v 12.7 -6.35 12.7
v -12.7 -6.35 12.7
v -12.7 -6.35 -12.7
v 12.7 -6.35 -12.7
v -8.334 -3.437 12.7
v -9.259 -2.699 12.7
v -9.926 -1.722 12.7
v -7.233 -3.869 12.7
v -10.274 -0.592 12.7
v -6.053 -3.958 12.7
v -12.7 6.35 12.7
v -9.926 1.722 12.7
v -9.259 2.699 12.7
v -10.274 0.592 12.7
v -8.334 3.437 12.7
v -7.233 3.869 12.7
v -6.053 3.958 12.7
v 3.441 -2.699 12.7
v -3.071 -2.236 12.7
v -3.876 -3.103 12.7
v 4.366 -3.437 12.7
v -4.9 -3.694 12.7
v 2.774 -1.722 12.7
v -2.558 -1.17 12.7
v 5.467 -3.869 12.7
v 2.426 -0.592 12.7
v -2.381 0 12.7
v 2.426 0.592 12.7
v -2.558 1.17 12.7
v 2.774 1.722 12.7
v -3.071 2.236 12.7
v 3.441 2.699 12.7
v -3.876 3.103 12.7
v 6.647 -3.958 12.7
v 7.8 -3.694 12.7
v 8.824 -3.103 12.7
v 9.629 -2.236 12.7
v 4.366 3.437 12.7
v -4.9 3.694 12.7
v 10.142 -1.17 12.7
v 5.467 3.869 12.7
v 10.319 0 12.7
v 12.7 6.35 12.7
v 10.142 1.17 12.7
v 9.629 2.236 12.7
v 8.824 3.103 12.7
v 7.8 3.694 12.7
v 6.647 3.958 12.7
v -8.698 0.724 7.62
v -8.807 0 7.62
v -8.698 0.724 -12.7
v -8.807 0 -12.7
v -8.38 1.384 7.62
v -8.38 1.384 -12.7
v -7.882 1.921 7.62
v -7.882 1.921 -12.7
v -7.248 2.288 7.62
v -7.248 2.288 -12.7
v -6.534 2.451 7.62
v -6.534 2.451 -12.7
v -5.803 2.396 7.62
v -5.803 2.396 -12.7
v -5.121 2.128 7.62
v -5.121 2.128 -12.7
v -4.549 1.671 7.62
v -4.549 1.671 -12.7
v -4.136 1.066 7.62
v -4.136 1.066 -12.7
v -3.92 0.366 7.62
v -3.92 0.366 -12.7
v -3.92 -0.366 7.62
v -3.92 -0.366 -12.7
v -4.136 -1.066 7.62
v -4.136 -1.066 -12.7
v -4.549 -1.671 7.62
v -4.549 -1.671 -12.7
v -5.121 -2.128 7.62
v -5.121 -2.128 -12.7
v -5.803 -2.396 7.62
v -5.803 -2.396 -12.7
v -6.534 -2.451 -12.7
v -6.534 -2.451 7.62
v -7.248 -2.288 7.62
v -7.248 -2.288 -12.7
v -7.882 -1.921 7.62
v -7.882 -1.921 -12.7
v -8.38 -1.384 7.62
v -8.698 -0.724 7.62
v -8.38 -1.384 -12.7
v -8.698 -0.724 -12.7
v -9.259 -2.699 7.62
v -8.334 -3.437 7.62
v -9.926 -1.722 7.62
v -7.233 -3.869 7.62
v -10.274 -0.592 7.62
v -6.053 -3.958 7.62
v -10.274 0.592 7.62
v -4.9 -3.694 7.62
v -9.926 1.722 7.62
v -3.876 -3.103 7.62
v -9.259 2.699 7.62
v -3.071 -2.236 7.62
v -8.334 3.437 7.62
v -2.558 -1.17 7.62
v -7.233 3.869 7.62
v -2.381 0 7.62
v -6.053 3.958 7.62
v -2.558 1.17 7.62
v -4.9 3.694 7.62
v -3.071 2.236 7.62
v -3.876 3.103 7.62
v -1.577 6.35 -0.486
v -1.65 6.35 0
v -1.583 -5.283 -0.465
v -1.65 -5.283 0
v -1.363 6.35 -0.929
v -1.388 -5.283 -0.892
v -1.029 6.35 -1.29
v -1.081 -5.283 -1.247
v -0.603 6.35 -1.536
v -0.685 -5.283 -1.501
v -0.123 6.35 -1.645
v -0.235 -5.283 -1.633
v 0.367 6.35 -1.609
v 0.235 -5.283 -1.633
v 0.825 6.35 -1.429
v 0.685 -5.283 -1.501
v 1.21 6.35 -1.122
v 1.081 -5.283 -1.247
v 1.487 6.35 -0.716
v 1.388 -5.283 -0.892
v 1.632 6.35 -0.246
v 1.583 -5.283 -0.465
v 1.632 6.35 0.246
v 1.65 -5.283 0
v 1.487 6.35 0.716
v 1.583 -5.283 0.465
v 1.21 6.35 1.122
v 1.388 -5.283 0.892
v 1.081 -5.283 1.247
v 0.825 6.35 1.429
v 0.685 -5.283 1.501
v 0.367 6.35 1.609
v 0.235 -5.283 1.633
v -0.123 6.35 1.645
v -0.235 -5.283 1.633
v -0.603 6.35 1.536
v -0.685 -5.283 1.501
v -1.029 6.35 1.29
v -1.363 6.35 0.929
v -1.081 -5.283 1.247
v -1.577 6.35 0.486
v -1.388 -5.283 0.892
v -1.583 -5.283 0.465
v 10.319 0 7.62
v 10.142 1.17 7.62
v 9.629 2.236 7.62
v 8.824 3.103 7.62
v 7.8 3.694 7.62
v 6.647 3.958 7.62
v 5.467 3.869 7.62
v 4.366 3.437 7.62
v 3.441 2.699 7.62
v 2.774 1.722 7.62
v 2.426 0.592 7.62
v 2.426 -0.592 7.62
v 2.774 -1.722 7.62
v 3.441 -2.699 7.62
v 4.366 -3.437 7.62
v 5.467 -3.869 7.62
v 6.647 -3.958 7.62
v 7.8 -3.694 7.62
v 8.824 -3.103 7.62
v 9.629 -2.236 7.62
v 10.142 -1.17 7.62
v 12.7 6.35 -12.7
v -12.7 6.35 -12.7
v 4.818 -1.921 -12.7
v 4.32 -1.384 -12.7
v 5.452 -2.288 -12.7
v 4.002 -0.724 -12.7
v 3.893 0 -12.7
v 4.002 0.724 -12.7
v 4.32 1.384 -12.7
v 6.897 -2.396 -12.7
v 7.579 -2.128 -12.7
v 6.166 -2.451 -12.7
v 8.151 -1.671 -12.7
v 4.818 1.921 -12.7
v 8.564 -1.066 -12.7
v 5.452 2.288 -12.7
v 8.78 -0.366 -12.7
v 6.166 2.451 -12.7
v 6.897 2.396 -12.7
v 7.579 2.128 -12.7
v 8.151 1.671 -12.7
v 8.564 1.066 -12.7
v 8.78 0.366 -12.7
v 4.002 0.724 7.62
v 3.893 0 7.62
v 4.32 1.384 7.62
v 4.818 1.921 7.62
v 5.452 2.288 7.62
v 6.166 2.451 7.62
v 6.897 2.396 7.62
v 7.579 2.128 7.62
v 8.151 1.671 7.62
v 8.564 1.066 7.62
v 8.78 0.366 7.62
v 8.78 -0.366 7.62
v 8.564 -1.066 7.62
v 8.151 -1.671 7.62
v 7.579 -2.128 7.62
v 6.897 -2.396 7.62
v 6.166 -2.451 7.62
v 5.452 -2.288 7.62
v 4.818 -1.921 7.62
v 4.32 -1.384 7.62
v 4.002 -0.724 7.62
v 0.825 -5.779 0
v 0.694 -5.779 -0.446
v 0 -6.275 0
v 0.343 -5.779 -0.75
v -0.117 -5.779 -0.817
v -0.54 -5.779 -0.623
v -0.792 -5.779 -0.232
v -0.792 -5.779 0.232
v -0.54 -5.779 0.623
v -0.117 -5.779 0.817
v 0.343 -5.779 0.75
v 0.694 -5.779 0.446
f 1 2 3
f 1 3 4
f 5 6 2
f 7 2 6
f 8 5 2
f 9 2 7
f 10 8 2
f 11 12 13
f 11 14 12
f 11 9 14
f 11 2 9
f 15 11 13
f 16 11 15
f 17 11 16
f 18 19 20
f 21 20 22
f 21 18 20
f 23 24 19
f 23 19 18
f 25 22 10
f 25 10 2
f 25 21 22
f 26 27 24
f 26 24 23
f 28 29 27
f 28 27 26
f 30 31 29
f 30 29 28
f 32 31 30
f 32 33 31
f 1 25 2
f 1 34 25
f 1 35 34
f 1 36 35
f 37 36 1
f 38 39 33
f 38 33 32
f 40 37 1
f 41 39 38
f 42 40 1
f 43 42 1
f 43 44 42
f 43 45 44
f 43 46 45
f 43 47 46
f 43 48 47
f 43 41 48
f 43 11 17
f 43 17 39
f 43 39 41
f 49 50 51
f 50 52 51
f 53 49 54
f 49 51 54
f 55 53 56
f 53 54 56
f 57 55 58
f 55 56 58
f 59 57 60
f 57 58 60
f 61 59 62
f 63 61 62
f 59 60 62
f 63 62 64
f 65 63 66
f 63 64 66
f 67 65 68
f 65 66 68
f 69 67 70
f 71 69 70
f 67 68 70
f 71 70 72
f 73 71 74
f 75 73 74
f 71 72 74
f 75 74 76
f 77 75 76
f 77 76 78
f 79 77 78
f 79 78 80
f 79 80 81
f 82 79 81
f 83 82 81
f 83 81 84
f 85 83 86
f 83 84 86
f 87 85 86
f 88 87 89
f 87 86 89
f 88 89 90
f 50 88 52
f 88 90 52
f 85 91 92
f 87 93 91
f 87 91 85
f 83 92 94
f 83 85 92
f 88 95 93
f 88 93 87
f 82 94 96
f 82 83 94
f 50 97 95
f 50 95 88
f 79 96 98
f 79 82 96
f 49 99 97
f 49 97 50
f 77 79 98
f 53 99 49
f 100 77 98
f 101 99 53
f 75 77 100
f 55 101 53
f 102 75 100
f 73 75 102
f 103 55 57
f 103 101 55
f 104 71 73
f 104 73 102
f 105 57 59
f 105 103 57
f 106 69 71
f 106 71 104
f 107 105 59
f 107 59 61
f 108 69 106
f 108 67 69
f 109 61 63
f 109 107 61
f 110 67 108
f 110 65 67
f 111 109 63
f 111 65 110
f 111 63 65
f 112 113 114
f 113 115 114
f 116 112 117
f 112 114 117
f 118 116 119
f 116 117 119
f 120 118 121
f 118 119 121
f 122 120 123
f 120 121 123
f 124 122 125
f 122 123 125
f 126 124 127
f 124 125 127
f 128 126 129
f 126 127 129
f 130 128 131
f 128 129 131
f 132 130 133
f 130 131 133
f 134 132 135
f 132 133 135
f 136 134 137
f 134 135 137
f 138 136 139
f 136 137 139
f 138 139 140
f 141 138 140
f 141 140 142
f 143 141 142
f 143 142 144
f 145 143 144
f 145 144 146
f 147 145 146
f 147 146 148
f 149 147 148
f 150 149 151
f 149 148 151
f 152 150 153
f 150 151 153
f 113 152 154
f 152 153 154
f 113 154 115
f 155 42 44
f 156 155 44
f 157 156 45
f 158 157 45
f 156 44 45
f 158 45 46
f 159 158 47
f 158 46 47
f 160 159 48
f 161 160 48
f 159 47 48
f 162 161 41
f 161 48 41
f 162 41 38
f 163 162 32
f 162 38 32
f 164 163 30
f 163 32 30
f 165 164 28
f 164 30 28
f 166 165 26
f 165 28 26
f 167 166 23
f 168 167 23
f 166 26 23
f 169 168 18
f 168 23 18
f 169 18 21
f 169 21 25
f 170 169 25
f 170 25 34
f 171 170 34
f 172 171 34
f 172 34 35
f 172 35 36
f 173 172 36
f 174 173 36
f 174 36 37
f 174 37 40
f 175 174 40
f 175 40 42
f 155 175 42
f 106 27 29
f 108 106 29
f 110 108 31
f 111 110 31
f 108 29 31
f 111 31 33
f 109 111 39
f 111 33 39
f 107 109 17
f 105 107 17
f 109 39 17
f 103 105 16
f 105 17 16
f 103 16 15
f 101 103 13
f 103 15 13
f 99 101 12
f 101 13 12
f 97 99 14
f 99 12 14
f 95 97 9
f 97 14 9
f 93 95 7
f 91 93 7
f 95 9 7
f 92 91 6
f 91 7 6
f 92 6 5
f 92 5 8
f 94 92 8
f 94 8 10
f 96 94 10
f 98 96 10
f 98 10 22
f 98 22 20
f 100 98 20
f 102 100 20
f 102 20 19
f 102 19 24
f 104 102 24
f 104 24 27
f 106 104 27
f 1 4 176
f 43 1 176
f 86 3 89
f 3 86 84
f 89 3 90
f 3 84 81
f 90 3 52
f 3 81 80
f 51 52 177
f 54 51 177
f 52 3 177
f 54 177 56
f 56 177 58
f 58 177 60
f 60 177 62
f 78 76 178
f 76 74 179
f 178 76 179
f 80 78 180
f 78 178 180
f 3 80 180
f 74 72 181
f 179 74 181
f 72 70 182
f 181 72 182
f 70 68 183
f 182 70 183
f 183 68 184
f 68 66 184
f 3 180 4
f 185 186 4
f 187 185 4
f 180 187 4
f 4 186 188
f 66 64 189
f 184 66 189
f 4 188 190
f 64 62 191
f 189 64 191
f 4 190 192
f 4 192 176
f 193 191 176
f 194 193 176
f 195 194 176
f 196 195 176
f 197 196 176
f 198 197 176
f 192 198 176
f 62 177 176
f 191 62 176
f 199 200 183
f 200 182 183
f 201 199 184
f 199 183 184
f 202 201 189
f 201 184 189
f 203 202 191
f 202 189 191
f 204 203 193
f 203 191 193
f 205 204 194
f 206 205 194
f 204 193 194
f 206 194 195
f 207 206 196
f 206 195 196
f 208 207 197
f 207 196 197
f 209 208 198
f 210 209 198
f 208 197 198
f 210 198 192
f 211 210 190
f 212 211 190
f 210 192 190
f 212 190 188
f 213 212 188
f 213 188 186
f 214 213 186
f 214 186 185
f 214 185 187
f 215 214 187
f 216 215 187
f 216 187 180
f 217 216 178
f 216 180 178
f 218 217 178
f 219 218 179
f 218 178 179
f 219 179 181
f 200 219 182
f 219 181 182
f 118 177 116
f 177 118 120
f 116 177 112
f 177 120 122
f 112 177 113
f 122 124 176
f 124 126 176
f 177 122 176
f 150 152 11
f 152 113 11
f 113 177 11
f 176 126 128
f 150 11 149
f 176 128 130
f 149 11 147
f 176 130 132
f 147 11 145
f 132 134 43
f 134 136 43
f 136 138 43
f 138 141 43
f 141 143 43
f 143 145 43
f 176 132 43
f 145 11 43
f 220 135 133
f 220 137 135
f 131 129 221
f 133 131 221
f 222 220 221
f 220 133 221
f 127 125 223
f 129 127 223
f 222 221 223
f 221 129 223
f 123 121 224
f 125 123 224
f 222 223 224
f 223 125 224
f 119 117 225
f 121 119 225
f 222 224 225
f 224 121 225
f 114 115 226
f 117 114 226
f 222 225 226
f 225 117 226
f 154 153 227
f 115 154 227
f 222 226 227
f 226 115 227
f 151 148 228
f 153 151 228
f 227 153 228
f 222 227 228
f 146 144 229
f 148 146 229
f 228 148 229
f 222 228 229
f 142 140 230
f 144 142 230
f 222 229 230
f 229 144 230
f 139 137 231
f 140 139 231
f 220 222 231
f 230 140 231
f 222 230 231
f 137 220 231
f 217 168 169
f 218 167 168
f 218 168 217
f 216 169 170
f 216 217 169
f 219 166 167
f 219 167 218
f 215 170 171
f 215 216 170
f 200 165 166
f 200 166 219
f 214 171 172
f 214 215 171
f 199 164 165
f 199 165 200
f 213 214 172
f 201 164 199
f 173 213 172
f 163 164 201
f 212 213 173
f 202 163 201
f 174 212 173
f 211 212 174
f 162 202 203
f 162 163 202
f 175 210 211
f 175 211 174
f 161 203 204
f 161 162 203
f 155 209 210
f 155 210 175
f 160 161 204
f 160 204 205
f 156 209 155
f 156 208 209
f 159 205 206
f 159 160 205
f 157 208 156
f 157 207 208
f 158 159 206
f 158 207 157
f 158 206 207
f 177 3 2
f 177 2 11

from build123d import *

# Parameters (mm, degrees)
SKETCH1_W                                      = 25.4
SKETCH1_H                                      = 12.7
BOSS_EXTRUDE1_DEPTH                            = 12.7
CBORE_FOR_8_SOCKET_HEAD_CAP_SCREW1_D           = 4.9149
CBORE_FOR_8_SOCKET_HEAD_CAP_SCREW1_CBORE_D     = 7.9375
CBORE_FOR_8_SOCKET_HEAD_CAP_SCREW1_CBORE_DEPTH = 5.08
M4X0_7_TAPPED_HOLE1_D                          = 3.3
M4X0_7_TAPPED_HOLE1_DEPTH                      = 11.6332
M4X0_7_TAPPED_HOLE1_TIP                        = 0.991420021


with BuildPart() as part:
    # Sketch1 → Boss-Extrude1 (new, symmetric)
    with BuildSketch(Plane.XY):
        Rectangle(SKETCH1_W, SKETCH1_H)
    extrude(amount=BOSS_EXTRUDE1_DEPTH, both=True)

    # CBORE for #8 Socket Head Cap Screw1 (through all)
    with Locations(Plane.XY.offset(12.7)):
        with Locations((-6.35, 0), (6.35, 0)):
            CounterBoreHole(CBORE_FOR_8_SOCKET_HEAD_CAP_SCREW1_D / 2, CBORE_FOR_8_SOCKET_HEAD_CAP_SCREW1_CBORE_D / 2, CBORE_FOR_8_SOCKET_HEAD_CAP_SCREW1_CBORE_DEPTH)

    # M4x0.7 Tapped Hole1
    with Locations(Plane(origin=(0, 6.35, 0), x_dir=(1, 0, 0), z_dir=(0, 1, 0))):
        with Locations((0, 0)):
            Hole(M4X0_7_TAPPED_HOLE1_D / 2, depth=M4X0_7_TAPPED_HOLE1_DEPTH)
            with Locations((0, 0, -(M4X0_7_TAPPED_HOLE1_DEPTH + M4X0_7_TAPPED_HOLE1_TIP / 2))):  # 118° drill point
                Cone(0, M4X0_7_TAPPED_HOLE1_D / 2, M4X0_7_TAPPED_HOLE1_TIP, mode=Mode.SUBTRACT)


solid = part.part
